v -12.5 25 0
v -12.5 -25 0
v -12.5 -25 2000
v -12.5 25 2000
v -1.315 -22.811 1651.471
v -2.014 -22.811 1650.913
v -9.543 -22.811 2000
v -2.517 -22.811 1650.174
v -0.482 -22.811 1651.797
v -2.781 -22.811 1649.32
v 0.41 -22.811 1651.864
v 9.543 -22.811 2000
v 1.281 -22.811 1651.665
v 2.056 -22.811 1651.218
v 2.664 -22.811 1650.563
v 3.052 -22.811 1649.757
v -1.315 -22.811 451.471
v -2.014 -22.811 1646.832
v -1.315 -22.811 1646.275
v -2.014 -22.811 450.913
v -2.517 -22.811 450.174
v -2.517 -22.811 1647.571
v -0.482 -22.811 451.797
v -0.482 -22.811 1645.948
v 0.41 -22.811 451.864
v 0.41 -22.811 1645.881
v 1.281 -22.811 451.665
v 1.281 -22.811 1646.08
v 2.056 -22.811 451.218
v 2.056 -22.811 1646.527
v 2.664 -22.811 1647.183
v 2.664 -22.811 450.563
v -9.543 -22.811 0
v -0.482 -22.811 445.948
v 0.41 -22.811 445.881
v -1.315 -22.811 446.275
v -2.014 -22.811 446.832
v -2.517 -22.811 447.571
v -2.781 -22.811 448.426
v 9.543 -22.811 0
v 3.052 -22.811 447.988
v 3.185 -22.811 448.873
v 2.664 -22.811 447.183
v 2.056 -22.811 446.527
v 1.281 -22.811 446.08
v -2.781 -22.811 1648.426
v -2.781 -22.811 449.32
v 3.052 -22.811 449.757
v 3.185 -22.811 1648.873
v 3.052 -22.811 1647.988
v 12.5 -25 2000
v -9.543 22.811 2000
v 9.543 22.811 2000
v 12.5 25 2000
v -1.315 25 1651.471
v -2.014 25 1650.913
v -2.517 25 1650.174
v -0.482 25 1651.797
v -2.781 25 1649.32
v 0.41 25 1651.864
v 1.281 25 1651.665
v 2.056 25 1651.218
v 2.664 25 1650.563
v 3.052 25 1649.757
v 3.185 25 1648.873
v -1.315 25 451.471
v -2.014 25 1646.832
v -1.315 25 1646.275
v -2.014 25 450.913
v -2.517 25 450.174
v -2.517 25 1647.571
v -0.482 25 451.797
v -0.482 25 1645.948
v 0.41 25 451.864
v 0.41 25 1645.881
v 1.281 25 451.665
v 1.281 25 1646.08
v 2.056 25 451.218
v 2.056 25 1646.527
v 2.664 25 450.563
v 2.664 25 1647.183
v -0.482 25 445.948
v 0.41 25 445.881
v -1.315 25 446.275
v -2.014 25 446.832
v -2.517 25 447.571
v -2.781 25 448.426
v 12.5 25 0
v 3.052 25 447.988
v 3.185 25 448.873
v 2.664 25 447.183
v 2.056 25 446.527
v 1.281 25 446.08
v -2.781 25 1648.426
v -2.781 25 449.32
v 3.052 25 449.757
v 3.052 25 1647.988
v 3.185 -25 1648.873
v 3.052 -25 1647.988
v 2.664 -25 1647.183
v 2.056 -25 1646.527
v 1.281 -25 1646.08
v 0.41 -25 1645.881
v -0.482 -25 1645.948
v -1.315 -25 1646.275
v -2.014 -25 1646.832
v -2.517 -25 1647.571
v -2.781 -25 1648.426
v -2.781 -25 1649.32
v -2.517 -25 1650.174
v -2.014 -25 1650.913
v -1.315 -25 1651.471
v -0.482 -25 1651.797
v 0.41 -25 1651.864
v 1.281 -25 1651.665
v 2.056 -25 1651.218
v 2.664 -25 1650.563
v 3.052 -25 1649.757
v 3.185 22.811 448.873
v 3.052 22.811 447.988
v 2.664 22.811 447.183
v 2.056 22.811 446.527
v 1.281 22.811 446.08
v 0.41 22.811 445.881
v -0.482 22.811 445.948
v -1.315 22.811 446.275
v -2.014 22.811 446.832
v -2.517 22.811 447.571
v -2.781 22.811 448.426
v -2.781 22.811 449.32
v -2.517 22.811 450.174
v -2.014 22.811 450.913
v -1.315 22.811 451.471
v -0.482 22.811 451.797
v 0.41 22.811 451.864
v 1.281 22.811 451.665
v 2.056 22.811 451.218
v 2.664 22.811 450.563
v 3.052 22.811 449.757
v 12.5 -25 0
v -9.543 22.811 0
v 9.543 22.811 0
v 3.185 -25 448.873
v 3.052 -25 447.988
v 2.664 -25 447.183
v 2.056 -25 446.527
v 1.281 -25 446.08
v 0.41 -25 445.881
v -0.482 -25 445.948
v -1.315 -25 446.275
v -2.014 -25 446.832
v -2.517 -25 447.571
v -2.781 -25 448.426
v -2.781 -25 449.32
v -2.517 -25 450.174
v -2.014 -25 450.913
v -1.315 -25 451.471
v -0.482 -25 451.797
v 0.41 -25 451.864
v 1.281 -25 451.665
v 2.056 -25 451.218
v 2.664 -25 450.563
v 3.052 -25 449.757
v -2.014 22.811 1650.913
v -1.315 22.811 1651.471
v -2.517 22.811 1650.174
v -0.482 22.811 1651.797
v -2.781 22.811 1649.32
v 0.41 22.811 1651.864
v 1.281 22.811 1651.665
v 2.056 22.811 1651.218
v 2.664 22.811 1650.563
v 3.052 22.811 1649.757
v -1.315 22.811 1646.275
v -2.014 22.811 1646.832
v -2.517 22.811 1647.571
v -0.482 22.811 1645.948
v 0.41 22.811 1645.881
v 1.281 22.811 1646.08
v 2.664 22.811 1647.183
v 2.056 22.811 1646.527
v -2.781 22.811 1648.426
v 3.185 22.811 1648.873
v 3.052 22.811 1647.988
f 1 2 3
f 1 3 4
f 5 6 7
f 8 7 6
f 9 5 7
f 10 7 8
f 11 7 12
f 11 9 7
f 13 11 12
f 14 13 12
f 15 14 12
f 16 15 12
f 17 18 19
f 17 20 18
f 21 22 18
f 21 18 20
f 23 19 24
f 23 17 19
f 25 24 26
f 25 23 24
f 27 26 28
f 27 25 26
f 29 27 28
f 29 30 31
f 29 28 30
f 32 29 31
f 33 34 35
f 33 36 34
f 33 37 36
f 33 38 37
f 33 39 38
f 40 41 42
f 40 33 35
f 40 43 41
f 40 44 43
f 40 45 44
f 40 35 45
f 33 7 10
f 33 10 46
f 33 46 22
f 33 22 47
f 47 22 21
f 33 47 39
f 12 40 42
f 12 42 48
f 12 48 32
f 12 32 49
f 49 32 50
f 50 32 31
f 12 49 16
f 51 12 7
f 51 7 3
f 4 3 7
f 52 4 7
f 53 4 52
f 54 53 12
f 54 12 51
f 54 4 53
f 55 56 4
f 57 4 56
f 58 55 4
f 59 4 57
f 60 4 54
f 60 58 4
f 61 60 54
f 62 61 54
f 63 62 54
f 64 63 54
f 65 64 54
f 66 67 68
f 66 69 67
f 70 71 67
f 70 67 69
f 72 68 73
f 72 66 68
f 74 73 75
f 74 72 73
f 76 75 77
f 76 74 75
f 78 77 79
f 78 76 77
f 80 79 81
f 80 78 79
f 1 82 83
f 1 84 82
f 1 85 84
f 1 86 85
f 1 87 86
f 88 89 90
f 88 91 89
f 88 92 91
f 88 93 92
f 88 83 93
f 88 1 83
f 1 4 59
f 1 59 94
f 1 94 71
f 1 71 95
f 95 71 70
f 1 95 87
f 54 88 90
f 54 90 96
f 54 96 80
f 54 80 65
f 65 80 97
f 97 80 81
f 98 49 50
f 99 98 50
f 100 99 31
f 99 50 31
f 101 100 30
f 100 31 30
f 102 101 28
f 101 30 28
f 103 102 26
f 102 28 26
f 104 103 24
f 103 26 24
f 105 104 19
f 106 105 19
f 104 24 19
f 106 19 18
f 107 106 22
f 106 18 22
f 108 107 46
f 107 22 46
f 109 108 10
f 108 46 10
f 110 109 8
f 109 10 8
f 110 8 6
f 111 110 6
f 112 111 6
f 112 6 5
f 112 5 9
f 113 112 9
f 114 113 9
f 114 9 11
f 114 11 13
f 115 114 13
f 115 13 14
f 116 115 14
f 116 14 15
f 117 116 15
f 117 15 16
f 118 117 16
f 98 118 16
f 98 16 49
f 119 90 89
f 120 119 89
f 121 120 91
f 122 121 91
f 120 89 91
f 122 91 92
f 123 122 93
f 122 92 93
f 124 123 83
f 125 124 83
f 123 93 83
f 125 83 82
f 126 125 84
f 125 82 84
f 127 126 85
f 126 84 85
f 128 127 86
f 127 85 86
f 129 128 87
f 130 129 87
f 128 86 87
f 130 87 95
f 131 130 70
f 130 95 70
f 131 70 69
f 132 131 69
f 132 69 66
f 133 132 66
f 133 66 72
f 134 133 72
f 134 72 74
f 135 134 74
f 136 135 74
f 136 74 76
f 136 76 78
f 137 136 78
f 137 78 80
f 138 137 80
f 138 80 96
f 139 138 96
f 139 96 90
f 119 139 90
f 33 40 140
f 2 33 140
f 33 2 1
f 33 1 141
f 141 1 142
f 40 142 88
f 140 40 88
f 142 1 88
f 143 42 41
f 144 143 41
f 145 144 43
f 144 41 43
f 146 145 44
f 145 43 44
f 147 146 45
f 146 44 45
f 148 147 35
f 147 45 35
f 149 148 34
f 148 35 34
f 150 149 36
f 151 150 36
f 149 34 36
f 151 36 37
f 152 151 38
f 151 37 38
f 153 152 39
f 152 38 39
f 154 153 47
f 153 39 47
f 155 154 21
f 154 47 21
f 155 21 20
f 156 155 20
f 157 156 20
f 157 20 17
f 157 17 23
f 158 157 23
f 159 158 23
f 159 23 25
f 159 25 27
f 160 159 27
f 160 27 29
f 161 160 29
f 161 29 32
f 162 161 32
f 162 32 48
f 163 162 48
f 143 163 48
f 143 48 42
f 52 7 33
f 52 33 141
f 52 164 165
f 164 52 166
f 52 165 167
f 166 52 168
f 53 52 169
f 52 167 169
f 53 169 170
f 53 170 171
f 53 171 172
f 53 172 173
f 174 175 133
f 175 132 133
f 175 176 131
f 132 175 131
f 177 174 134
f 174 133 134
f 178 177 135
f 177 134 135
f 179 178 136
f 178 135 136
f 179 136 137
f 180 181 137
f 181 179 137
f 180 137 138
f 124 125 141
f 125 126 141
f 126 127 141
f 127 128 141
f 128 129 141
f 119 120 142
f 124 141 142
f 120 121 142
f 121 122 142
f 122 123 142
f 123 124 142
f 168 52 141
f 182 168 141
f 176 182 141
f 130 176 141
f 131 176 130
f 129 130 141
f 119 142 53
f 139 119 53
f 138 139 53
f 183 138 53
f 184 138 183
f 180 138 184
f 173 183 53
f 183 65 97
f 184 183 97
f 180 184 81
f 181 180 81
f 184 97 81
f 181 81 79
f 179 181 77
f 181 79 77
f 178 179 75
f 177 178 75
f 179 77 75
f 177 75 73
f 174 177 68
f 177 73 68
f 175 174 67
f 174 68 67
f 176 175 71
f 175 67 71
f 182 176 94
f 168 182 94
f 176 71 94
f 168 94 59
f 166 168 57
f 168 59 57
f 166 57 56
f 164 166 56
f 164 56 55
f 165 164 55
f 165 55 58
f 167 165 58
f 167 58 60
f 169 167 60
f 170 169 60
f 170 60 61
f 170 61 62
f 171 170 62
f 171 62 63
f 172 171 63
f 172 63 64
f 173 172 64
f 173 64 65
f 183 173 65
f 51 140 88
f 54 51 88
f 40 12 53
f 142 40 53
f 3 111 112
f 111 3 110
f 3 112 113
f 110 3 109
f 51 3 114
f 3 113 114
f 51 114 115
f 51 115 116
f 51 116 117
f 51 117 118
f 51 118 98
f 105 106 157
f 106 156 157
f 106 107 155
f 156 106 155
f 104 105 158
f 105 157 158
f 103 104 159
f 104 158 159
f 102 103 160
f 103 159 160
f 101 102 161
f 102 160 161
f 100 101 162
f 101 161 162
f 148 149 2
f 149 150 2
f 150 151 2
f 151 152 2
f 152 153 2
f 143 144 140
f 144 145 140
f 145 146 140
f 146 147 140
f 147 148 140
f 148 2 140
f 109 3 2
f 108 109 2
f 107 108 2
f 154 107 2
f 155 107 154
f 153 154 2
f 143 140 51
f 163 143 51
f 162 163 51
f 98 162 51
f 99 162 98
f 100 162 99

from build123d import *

# Parameters (mm, degrees)
ESQUISSE1_W                  = 25
ESQUISSE1_H                  = 50
ESQUISSE1_W_2                = 19.086637974
ESQUISSE1_H_2                = 45.621468926
BOSS_EXTRU_1_DEPTH           = 2000
ESQUISSE2_R                  = 3
ENL_V_MAT_EXTRU_1_DEPTH      = 1
ENL_V_MAT_EXTRU_1_DEPTH_BACK = 51
ESQUISSE3_R                  = 3
ENL_V_MAT_EXTRU_2_DEPTH      = 1
ENL_V_MAT_EXTRU_2_DEPTH_BACK = 51


with BuildPart() as part:
    # Esquisse1 → Boss.-Extru.1 (new body)
    with BuildSketch(Plane.XY):
        Rectangle(ESQUISSE1_W, ESQUISSE1_H)
        Rectangle(ESQUISSE1_W_2, ESQUISSE1_H_2, mode=Mode.SUBTRACT)
    extrude(amount=BOSS_EXTRU_1_DEPTH)

    # Esquisse2 → Enlèv. mat.-Extru.1 (cut, two sides)
    with BuildSketch(Plane(origin=(0, 25, 0), x_dir=(1, 0, 0), z_dir=(0, 1, 0))) as enl_v_mat_extru_1_sk:
        with Locations((0.185438708, -1648.872663575)):
            Circle(ESQUISSE2_R)
    extrude(amount=ENL_V_MAT_EXTRU_1_DEPTH, mode=Mode.SUBTRACT)
    extrude(enl_v_mat_extru_1_sk.sketch, amount=-ENL_V_MAT_EXTRU_1_DEPTH_BACK, mode=Mode.SUBTRACT)

    # Esquisse3 → Enlèv. mat.-Extru.2 (cut, two sides)
    with BuildSketch(Plane(origin=(0, 25, 0), x_dir=(1, 0, 0), z_dir=(0, 1, 0))) as enl_v_mat_extru_2_sk:
        with Locations((0.185438708, -448.872663575)):
            Circle(ESQUISSE3_R)
    extrude(amount=ENL_V_MAT_EXTRU_2_DEPTH, mode=Mode.SUBTRACT)
    extrude(enl_v_mat_extru_2_sk.sketch, amount=-ENL_V_MAT_EXTRU_2_DEPTH_BACK, mode=Mode.SUBTRACT)


solid = part.part
